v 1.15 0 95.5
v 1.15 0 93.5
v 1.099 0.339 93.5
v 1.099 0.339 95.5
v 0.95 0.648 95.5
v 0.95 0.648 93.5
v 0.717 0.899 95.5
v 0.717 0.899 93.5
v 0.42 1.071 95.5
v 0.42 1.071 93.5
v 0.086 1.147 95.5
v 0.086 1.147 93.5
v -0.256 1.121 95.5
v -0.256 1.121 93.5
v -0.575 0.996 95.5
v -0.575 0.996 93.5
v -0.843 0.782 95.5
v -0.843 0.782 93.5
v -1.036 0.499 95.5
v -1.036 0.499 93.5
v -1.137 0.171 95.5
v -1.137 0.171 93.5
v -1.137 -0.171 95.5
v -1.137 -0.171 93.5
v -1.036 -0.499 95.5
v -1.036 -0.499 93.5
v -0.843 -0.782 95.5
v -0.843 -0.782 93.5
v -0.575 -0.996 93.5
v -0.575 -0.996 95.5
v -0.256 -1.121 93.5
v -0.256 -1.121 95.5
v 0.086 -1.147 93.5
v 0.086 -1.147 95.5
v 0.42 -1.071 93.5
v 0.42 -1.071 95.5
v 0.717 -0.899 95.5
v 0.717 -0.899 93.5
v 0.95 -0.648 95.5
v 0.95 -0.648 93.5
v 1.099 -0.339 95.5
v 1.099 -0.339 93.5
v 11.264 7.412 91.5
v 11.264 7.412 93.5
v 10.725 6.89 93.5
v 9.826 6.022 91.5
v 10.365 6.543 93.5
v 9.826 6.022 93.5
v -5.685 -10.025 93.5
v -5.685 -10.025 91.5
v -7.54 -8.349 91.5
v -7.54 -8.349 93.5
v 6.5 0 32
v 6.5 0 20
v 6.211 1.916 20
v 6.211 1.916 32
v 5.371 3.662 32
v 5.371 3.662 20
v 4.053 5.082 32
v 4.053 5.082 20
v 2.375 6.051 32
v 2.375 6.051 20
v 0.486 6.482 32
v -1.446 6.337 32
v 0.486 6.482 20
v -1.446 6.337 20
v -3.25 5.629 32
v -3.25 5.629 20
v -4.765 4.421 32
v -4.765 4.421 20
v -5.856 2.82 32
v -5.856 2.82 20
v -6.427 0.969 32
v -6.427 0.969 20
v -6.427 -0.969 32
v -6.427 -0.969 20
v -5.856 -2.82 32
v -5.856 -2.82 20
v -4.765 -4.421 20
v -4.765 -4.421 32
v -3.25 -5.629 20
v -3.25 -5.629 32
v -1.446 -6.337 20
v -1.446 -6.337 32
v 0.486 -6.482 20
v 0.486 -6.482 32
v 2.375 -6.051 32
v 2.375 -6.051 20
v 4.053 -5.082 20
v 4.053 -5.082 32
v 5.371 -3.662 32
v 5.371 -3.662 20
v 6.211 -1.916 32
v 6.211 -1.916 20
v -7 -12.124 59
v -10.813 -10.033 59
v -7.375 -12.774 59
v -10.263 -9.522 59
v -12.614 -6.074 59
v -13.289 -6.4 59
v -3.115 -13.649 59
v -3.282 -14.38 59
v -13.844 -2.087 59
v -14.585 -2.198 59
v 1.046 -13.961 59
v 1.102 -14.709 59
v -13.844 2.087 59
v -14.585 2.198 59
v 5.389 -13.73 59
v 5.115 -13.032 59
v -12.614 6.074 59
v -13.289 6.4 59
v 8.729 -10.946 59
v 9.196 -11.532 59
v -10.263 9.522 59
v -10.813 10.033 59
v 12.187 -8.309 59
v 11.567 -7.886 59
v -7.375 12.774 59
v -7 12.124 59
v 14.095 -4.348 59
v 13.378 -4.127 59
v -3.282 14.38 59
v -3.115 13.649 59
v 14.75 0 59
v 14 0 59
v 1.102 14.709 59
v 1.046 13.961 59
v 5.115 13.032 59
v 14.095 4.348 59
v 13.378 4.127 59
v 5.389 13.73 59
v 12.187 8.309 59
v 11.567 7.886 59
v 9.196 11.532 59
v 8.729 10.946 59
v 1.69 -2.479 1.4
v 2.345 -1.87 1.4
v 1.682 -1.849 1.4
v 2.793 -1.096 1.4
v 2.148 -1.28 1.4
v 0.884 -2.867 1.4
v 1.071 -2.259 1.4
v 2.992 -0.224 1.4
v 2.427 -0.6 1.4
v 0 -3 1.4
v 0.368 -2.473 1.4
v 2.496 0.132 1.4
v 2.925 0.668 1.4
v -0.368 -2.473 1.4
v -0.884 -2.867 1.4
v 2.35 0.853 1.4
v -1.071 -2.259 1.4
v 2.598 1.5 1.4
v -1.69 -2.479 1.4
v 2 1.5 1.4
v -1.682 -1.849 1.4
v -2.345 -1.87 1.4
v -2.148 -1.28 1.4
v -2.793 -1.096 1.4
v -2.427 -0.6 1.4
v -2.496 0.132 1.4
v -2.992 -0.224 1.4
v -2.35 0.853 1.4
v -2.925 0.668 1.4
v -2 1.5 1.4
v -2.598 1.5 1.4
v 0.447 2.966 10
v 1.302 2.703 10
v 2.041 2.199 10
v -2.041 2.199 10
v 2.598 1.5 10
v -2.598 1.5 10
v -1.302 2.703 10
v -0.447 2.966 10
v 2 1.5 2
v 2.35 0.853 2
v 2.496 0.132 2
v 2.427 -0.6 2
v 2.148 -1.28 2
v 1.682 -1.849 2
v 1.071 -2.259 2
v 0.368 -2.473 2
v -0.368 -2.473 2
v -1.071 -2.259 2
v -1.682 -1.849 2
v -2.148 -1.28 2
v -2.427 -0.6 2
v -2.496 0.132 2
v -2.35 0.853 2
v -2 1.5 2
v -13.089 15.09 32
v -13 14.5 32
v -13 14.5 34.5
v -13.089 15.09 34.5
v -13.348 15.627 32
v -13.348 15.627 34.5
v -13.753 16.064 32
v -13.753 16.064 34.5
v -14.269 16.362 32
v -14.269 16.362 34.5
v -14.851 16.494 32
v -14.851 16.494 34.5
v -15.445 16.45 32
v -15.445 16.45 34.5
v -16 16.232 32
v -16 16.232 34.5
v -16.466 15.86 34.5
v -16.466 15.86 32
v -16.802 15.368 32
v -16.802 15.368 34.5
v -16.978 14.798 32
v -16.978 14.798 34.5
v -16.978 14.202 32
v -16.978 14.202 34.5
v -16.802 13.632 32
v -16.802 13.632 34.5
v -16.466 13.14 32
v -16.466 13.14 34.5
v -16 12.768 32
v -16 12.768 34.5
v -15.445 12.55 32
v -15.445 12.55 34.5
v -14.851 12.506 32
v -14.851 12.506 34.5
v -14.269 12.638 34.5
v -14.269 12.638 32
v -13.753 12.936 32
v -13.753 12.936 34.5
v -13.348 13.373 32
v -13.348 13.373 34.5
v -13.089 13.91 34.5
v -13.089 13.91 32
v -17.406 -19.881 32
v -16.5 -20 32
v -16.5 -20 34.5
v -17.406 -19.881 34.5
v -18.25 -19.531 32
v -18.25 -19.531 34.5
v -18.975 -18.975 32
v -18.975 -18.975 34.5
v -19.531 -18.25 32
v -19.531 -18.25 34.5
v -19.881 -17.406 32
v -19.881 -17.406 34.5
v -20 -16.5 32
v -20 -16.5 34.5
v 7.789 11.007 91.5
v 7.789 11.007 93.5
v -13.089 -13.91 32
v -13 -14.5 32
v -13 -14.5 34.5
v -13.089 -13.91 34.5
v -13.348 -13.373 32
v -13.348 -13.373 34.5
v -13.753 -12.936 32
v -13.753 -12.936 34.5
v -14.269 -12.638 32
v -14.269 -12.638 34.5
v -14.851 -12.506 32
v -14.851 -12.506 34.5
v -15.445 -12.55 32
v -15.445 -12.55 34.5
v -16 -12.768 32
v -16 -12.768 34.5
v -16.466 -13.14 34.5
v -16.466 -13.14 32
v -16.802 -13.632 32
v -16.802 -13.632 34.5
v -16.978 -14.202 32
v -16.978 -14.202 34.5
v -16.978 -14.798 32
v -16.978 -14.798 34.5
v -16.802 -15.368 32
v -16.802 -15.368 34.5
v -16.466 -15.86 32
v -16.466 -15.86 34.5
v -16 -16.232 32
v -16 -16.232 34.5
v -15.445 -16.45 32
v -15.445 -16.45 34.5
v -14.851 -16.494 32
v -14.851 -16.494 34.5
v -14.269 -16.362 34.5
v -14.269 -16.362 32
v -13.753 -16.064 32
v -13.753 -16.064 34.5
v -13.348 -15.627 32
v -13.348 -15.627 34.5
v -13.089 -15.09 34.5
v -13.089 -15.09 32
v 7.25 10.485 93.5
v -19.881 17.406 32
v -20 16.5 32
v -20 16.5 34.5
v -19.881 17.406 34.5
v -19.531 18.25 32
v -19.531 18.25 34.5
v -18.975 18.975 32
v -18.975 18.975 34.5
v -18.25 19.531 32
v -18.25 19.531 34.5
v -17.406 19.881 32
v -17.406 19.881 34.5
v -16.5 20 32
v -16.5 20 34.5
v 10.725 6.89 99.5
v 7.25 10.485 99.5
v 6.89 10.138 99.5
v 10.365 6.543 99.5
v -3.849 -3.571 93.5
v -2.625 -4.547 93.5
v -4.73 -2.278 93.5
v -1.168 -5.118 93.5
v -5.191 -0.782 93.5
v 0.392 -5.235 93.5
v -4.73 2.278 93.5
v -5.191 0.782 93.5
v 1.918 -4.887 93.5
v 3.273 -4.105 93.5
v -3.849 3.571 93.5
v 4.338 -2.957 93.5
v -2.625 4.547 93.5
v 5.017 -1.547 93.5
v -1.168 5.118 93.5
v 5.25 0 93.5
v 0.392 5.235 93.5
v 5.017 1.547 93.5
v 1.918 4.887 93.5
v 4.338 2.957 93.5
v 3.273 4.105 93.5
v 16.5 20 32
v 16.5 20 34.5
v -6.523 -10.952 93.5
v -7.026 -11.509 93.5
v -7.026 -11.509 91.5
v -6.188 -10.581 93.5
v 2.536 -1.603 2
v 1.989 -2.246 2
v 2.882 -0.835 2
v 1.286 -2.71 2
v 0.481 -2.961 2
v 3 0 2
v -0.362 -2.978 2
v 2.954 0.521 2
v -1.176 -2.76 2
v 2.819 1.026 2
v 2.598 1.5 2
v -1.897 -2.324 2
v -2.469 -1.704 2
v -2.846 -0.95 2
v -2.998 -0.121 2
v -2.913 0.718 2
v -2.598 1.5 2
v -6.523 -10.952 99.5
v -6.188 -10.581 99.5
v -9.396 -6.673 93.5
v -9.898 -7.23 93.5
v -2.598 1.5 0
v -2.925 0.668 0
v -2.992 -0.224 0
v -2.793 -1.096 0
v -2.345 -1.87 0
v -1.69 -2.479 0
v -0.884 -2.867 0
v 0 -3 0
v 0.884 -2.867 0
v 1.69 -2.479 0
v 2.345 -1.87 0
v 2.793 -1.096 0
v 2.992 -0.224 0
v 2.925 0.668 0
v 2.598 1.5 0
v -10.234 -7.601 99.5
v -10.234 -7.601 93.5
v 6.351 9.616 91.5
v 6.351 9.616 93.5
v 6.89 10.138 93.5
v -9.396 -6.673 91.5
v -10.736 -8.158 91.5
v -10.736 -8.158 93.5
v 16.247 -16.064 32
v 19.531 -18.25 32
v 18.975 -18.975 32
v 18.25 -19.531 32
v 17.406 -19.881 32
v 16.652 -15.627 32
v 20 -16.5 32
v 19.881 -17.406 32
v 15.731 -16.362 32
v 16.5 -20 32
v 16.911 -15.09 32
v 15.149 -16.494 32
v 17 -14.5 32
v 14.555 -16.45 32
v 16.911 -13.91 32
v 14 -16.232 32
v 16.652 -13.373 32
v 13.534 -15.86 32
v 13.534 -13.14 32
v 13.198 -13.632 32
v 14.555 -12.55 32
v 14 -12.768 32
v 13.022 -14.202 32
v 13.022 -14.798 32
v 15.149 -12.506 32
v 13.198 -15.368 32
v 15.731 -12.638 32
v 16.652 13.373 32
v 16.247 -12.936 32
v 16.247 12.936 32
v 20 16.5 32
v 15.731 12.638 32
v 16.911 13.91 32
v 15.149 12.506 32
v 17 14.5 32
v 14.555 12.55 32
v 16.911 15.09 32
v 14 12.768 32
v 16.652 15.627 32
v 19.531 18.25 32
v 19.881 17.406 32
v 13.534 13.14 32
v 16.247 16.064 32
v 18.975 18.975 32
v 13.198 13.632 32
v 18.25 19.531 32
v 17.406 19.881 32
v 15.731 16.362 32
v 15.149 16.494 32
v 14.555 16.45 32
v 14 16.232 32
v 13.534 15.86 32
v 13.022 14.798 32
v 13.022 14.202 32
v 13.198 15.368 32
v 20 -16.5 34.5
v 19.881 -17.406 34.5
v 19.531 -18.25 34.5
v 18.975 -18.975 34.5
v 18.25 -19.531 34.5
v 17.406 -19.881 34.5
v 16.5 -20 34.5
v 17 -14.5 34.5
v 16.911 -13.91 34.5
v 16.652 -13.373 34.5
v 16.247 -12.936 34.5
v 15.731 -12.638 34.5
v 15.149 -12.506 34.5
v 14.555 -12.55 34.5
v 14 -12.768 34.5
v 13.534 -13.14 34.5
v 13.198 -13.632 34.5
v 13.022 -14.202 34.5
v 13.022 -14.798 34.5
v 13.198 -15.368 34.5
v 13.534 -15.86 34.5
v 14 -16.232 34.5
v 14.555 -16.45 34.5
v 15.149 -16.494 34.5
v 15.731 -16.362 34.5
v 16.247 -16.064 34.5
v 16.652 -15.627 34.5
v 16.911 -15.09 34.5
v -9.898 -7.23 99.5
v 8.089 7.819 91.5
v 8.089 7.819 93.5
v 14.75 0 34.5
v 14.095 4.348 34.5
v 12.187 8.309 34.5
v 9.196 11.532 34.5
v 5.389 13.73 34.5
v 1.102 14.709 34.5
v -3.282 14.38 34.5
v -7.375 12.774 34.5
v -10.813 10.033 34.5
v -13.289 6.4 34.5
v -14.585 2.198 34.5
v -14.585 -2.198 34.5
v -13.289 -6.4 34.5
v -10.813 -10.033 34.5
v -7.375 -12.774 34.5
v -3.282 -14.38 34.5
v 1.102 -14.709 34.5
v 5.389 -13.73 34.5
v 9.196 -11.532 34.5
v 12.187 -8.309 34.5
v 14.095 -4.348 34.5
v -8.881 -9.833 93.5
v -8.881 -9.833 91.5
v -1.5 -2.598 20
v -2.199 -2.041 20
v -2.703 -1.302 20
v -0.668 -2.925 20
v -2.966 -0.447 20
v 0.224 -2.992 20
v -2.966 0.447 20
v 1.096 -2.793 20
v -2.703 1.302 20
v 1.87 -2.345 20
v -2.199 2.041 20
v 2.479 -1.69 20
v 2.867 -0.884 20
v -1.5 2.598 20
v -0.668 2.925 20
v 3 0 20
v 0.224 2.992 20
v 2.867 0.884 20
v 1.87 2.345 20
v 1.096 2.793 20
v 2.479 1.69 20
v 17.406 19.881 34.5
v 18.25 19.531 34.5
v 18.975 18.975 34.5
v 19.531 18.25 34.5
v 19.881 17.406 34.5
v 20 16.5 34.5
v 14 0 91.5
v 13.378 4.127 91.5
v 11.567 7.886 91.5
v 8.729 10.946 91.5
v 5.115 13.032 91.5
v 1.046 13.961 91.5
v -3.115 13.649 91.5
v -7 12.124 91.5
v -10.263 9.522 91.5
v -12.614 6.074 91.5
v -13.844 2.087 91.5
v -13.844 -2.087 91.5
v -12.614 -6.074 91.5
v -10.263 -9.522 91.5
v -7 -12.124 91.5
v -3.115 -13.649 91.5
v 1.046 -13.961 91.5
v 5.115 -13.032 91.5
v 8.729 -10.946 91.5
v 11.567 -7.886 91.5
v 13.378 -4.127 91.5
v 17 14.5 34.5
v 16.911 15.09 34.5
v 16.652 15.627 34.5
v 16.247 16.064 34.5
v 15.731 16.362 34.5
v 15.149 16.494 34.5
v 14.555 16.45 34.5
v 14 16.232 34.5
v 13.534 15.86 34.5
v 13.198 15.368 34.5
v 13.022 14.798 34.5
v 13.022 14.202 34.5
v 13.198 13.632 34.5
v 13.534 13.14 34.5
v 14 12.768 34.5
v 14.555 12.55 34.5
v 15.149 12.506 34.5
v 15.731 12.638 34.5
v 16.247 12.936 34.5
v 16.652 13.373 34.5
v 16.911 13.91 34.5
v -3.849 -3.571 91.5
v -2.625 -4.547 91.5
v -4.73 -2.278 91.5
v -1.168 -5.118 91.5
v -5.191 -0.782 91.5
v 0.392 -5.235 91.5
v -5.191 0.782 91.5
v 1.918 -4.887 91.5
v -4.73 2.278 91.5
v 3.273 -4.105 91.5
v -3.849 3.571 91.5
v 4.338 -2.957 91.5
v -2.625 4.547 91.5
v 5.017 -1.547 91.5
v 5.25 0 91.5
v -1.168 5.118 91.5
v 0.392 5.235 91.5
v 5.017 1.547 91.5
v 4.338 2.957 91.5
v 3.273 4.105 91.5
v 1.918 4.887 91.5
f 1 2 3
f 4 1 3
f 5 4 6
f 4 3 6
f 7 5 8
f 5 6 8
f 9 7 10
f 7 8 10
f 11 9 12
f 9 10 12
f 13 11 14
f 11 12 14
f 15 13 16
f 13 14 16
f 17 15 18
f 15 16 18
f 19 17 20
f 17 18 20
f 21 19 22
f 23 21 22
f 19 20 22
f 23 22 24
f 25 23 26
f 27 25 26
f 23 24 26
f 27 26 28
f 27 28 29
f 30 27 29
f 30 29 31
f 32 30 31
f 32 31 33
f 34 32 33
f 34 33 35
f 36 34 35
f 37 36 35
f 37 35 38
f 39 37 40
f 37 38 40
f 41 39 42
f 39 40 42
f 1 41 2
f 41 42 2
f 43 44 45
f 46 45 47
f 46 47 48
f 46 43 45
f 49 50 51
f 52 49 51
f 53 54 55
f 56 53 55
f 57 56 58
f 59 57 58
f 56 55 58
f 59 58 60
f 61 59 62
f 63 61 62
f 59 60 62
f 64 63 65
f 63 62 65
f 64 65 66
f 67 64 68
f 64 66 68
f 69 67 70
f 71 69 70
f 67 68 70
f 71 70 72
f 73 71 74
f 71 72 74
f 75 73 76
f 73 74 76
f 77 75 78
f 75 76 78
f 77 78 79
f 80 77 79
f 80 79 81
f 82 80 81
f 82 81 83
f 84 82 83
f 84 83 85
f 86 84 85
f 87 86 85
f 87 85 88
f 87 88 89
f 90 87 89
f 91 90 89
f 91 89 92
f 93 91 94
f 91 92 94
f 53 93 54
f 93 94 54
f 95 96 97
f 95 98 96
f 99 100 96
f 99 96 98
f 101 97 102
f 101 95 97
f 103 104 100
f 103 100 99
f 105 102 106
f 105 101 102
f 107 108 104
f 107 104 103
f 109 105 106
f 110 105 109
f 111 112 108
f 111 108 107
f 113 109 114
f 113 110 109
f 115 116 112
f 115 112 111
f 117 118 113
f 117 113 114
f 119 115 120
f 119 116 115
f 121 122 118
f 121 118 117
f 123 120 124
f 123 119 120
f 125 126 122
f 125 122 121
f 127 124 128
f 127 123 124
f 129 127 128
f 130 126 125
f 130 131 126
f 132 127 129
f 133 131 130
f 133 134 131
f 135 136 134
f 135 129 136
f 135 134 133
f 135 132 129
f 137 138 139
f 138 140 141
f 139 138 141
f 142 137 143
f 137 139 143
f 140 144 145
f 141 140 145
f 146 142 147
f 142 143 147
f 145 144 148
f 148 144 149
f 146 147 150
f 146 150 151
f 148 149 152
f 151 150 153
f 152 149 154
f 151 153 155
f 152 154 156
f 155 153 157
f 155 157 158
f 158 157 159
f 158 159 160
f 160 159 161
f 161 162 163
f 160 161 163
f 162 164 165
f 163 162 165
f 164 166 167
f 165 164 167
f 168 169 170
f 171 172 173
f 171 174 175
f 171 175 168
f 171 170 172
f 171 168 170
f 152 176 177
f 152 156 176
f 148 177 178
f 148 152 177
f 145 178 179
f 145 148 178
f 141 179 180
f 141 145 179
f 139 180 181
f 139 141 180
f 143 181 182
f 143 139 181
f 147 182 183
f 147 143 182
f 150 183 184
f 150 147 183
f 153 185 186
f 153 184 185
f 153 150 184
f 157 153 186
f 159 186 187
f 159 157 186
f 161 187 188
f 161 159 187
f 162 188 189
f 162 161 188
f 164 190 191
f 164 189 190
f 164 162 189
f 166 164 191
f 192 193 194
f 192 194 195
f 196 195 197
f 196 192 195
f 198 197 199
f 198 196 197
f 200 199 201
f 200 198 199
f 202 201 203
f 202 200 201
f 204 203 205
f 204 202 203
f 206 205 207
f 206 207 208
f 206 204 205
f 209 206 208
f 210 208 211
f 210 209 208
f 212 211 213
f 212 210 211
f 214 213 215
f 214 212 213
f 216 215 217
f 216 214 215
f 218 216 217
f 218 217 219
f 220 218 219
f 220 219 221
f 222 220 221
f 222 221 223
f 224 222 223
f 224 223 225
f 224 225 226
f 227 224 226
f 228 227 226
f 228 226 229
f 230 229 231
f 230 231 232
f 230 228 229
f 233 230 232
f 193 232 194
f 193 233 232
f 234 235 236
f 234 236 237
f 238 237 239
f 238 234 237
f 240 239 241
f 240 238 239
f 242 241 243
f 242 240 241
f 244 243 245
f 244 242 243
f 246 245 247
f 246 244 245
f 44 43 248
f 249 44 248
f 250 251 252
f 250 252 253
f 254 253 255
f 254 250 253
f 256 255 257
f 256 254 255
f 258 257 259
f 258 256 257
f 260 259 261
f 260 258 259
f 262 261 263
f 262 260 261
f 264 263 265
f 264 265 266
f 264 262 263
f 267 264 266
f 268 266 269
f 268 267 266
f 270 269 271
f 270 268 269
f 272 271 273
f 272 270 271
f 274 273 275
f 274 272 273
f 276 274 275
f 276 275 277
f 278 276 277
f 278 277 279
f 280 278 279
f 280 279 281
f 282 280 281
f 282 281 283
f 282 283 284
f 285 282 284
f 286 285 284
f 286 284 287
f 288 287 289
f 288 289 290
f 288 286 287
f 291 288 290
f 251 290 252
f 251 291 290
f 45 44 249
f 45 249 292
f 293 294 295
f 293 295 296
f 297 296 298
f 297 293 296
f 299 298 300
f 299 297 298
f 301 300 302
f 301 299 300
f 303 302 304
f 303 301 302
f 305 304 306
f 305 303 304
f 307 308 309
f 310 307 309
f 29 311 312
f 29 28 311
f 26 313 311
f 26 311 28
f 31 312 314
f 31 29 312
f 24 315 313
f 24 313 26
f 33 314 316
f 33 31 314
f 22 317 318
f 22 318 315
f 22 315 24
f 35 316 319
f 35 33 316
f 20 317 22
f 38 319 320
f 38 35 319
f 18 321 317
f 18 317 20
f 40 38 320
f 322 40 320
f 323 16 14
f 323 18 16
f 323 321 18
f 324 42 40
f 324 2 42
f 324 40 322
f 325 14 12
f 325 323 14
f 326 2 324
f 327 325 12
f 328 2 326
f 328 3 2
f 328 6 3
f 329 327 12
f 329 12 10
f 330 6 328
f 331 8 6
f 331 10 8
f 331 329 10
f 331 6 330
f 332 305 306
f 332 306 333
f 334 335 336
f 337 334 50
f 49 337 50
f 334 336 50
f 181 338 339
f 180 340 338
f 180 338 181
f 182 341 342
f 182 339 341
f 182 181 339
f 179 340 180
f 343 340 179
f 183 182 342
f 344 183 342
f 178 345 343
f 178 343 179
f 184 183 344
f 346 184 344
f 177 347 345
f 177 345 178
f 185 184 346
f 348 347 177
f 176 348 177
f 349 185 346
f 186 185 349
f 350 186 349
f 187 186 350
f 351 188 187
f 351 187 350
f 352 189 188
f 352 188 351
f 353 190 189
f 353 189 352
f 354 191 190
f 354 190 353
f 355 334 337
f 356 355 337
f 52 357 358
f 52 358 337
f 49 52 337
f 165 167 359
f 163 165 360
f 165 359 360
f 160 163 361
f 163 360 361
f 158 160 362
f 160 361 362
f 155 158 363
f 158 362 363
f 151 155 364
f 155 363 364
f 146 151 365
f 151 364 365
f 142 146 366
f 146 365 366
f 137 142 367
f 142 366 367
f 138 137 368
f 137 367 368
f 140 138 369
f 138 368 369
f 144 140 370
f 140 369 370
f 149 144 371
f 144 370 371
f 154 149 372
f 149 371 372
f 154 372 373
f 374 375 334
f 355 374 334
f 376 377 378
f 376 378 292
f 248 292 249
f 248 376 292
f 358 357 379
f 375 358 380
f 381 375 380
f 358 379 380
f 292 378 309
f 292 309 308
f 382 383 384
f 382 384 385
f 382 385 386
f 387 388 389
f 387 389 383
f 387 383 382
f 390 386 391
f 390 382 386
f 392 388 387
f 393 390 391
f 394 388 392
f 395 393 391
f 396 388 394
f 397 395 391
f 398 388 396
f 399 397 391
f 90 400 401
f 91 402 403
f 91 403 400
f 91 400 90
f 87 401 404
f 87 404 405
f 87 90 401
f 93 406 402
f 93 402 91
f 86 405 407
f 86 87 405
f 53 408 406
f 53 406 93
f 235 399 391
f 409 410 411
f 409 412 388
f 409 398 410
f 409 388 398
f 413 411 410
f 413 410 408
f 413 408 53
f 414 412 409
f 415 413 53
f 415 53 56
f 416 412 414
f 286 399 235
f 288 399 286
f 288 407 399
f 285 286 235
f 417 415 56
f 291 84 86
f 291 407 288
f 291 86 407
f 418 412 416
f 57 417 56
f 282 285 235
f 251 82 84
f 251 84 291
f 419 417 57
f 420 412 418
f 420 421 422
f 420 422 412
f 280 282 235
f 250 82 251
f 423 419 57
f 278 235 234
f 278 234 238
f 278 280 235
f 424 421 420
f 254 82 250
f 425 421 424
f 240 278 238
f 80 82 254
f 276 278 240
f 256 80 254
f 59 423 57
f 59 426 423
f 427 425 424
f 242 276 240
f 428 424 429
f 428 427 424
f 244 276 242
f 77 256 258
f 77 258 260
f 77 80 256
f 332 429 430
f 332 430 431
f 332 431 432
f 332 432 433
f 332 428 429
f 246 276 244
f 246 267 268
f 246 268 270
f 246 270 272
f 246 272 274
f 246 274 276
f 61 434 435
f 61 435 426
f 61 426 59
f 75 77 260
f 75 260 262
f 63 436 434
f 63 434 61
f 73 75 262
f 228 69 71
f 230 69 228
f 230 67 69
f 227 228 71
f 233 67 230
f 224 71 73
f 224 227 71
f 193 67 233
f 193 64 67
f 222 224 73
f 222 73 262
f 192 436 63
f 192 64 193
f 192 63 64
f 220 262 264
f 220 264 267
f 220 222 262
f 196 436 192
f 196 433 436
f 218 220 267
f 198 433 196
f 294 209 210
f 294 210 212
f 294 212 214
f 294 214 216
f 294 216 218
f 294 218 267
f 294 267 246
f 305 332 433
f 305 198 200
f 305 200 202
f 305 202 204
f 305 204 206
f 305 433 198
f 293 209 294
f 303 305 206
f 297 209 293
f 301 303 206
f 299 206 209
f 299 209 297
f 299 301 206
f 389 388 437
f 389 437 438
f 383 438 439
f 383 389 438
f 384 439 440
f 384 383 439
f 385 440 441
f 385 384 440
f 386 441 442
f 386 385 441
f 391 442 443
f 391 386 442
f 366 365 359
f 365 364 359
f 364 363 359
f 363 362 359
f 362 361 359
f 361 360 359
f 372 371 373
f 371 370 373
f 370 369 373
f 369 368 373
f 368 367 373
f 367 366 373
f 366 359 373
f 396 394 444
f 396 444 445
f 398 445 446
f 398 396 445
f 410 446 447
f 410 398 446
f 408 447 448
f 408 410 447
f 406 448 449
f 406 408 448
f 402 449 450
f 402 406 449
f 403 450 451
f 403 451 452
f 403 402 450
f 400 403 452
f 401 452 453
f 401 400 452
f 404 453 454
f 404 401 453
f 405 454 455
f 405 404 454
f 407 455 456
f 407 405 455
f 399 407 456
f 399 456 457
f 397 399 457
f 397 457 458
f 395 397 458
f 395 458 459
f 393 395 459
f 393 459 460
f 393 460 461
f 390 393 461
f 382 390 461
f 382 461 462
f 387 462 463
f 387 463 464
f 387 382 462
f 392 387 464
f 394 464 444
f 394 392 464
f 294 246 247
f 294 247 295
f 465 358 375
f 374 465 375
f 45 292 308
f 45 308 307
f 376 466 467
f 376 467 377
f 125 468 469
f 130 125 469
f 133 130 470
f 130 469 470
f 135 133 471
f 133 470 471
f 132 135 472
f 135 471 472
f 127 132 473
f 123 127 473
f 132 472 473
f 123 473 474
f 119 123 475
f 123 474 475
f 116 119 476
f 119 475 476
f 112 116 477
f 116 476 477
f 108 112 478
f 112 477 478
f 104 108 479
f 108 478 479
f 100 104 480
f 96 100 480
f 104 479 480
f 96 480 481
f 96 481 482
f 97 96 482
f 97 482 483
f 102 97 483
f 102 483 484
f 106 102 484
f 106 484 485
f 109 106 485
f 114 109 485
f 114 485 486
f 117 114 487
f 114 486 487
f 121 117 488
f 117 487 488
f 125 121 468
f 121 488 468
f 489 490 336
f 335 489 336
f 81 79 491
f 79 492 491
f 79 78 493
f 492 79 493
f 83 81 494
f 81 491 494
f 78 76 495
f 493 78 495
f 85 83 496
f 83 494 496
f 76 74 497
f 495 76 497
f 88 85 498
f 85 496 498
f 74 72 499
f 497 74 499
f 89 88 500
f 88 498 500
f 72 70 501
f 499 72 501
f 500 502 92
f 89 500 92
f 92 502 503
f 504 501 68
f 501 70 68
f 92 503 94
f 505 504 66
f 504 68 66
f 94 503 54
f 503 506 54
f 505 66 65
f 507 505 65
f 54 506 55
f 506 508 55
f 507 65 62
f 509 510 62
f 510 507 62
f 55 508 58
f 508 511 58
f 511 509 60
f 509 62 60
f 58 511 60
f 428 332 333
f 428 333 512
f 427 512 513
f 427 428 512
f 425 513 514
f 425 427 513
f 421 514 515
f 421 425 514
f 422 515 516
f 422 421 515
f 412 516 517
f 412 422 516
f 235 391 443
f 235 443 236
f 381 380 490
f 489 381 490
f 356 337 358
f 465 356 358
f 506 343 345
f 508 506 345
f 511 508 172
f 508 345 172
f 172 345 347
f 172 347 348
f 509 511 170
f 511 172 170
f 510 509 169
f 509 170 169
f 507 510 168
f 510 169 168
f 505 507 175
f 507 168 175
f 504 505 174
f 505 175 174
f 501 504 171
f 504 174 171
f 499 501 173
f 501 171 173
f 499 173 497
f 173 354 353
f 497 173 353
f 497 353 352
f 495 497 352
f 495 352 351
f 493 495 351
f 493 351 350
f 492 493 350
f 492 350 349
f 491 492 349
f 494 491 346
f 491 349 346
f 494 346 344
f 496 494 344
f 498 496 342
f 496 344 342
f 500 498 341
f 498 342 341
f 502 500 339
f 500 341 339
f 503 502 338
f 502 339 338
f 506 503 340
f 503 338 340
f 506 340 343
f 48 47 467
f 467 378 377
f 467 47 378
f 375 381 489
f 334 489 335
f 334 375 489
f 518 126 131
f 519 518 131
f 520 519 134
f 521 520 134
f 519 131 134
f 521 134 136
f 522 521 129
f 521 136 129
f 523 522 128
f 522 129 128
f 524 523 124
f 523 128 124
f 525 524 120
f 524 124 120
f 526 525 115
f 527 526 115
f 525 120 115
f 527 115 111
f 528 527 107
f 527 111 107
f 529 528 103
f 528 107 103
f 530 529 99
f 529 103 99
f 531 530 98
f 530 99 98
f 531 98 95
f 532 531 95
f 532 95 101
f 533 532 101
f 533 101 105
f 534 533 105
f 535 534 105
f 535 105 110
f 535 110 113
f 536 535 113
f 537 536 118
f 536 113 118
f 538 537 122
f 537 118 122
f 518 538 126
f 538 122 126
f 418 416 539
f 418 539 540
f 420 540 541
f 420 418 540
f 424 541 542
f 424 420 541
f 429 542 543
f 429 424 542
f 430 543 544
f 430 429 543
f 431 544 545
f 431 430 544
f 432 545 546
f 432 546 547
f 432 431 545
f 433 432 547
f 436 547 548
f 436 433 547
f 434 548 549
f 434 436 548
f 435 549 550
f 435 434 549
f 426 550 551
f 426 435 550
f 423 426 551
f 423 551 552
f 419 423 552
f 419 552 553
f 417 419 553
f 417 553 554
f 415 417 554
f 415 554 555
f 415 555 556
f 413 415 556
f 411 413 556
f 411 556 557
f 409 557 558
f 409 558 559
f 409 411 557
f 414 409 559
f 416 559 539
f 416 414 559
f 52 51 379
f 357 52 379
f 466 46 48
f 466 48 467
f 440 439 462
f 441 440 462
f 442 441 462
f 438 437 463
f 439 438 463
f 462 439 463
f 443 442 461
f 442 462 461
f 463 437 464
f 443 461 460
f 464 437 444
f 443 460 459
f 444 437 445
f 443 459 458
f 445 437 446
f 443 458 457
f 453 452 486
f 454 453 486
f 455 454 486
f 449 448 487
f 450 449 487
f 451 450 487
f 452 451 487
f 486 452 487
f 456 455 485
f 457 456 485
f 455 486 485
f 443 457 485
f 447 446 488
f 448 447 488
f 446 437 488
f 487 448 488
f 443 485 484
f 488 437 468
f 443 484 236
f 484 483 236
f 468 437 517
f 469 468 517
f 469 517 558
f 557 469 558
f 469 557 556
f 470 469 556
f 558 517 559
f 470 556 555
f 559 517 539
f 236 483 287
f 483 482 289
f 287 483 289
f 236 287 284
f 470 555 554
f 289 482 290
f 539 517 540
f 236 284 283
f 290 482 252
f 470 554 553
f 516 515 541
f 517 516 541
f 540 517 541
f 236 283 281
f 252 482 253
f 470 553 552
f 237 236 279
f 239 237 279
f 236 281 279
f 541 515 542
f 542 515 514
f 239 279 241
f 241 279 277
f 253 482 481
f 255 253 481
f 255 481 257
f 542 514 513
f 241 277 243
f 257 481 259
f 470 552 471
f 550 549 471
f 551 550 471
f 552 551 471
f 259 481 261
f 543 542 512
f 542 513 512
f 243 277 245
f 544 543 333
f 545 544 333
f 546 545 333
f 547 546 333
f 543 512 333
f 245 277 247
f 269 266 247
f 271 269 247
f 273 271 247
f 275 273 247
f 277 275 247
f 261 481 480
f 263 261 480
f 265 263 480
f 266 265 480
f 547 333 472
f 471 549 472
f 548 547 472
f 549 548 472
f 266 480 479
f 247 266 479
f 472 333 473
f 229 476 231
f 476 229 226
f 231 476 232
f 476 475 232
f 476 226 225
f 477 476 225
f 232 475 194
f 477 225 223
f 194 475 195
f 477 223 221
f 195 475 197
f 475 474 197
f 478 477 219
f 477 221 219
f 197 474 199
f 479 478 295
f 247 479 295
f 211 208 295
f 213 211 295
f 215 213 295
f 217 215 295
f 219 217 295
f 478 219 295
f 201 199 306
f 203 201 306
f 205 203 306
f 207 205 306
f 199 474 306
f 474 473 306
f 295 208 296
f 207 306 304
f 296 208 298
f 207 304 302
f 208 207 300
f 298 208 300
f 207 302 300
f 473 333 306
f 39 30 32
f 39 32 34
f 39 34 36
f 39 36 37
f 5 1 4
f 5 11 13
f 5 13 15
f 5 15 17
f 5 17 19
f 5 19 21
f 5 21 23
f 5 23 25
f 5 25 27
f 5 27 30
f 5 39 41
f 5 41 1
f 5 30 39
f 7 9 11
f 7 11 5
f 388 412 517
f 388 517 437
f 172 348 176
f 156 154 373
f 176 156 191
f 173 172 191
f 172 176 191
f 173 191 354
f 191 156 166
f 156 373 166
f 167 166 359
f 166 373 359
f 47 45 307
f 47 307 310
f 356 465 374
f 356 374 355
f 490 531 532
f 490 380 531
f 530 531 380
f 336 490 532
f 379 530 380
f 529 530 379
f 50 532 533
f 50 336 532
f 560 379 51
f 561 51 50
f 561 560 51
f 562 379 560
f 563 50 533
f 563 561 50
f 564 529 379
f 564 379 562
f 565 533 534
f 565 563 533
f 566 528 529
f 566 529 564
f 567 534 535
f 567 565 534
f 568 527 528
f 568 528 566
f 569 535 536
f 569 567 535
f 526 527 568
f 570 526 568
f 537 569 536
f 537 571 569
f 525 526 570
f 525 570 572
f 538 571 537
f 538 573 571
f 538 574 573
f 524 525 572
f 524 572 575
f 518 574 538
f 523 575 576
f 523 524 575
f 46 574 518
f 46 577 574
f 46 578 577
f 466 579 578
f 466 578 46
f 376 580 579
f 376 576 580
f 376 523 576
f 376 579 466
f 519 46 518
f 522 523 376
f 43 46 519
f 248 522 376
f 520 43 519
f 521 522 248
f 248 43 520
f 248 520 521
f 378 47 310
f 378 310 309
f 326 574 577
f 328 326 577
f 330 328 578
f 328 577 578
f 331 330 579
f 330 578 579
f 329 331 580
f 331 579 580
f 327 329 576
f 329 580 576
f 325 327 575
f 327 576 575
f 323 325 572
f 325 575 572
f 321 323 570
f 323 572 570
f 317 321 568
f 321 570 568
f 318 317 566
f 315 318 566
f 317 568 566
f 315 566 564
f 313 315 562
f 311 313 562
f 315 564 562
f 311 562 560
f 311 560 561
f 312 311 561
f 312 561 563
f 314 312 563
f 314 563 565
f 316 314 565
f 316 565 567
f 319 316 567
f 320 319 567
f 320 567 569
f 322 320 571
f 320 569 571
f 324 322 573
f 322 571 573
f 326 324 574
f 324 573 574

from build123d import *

# Parameters (mm, degrees)
CROQUIS1_R              = 3
SALIENTE_EXTRUIR1_DEPTH = 20
CROQUIS3_R              = 6.5
SALIENTE_EXTRUIR2_DEPTH = 12
CROQUIS4_R              = 2
SALIENTE_EXTRUIR3_DEPTH = 2.5
CROQUIS5_R              = 14.75
SALIENTE_EXTRUIR4_DEPTH = 24.5
CROQUIS6_R              = 14
SALIENTE_EXTRUIR5_DEPTH = 32.5
CROQUIS7_R              = 5.25
SALIENTE_EXTRUIR6_DEPTH = 2
CROQUIS8_R              = 1.15
SALIENTE_EXTRUIR7_DEPTH = 2
SALIENTE_EXTRUIR8_DEPTH = 2
SALIENTE_EXTRUIR9_DEPTH = 6
CORTAR_EXTRUIR1_DEPTH   = 10
CROQUIS12_W             = 0.5
CROQUIS12_H             = 0.6


with BuildPart() as part:
    # Croquis1 → Saliente-Extruir1 (new body)
    with BuildSketch(Plane.XY):
        Circle(CROQUIS1_R)
    extrude(amount=SALIENTE_EXTRUIR1_DEPTH)

    # Croquis3 → Saliente-Extruir2 (add)
    with BuildSketch(Plane.XY.offset(20)):
        Circle(CROQUIS3_R)
    extrude(amount=SALIENTE_EXTRUIR2_DEPTH)

    # Croquis4 → Saliente-Extruir3 (add)
    with BuildSketch(Plane.XY.offset(32)):
        with BuildLine():
            Line((16.5, -20), (-16.5, -20))
            ThreePointArc((-16.5, -20), (-18.974873734, -18.974873734), (-20, -16.5))
            Line((-20, -16.5), (-20, 16.5))
            ThreePointArc((-20, 16.5), (-18.974873734, 18.974873734), (-16.5, 20))
            Line((-16.5, 20), (16.5, 20))
            ThreePointArc((16.5, 20), (18.974873734, 18.974873734), (20, 16.5))
            Line((20, 16.5), (20, -16.5))
            ThreePointArc((20, -16.5), (18.974873734, -18.974873734), (16.5, -20))
        make_face()
        with Locations((15, 14.5)):
            Circle(CROQUIS4_R, mode=Mode.SUBTRACT)
        with Locations((15, -14.5)):
            Circle(CROQUIS4_R, mode=Mode.SUBTRACT)
        with Locations((-15, -14.5)):
            Circle(CROQUIS4_R, mode=Mode.SUBTRACT)
        with Locations((-15, 14.5)):
            Circle(CROQUIS4_R, mode=Mode.SUBTRACT)
    extrude(amount=SALIENTE_EXTRUIR3_DEPTH)

    # Croquis5 → Saliente-Extruir4 (add)
    with BuildSketch(Plane.XY.offset(34.5)):
        Circle(CROQUIS5_R)
    extrude(amount=SALIENTE_EXTRUIR4_DEPTH)

    # Croquis6 → Saliente-Extruir5 (add)
    with BuildSketch(Plane.XY.offset(59)):
        Circle(CROQUIS6_R)
    extrude(amount=SALIENTE_EXTRUIR5_DEPTH)

    # Croquis7 → Saliente-Extruir6 (add)
    with BuildSketch(Plane.XY.offset(91.5)):
        Circle(CROQUIS7_R)
    extrude(amount=SALIENTE_EXTRUIR6_DEPTH)

    # Croquis8 → Saliente-Extruir7 (add)
    with BuildSketch(Plane.XY.offset(93.5)):
        Circle(CROQUIS8_R)
    extrude(amount=SALIENTE_EXTRUIR7_DEPTH)

    # Croquis9 → Saliente-Extruir8 (add)
    with BuildSketch(Plane.XY.offset(91.5)):
        Polygon((8.088619231, 7.81899859), (6.351063988, 9.61646953), (7.789040741, 11.006513723), (9.526595983, 9.209042783), (11.264151225, 7.411571843), (9.826174473, 6.021527649), align=None)
        Polygon((-9.395717522, -6.673304447), (-10.736232323, -8.15756186), (-8.880910557, -9.833205361), (-7.025588791, -11.508848863), (-5.68507399, -10.02459145), (-7.540395756, -8.348947948), align=None)
    extrude(amount=SALIENTE_EXTRUIR8_DEPTH)

    # Croquis10 → Saliente-Extruir9 (add)
    with BuildSketch(Plane.XY.offset(93.5)):
        Polygon((-6.18776704, -10.581187979), (-9.898410573, -7.229900977), (-10.233539273, -7.60096533), (-6.52289574, -10.952252333), align=None)
        Polygon((6.89030527, 10.137736102), (7.249799458, 10.485247151), (10.724909943, 6.89030527), (10.365415755, 6.542794222), align=None)
    extrude(amount=SALIENTE_EXTRUIR9_DEPTH)

    # Croquis11 → Cortar-Extruir1 (cut)
    with BuildSketch(Plane(origin=(0, 0, 0), x_dir=(-1, 0, 0), z_dir=(0, 0, -1))):
        with BuildLine():
            Line((-2.598076211, 1.5), (2.598076211, 1.5))
            ThreePointArc((2.598076211, 1.5), (0, 3), (-2.598076211, 1.5))
        make_face()
    extrude(amount=-CORTAR_EXTRUIR1_DEPTH, mode=Mode.SUBTRACT)

    # Croquis12 → Cortar-Revolución1 (revolve, cut)
    with BuildSketch(Plane(origin=(0, 0, 0), x_dir=(1, 0, 0), z_dir=(0, 1, 0))):
        with Locations((-2.75, -1.7)):
            Rectangle(CROQUIS12_W, CROQUIS12_H)
    revolve(axis=Axis((0, 0, 20), (0, 0, -1)), mode=Mode.SUBTRACT)


solid = part.part
